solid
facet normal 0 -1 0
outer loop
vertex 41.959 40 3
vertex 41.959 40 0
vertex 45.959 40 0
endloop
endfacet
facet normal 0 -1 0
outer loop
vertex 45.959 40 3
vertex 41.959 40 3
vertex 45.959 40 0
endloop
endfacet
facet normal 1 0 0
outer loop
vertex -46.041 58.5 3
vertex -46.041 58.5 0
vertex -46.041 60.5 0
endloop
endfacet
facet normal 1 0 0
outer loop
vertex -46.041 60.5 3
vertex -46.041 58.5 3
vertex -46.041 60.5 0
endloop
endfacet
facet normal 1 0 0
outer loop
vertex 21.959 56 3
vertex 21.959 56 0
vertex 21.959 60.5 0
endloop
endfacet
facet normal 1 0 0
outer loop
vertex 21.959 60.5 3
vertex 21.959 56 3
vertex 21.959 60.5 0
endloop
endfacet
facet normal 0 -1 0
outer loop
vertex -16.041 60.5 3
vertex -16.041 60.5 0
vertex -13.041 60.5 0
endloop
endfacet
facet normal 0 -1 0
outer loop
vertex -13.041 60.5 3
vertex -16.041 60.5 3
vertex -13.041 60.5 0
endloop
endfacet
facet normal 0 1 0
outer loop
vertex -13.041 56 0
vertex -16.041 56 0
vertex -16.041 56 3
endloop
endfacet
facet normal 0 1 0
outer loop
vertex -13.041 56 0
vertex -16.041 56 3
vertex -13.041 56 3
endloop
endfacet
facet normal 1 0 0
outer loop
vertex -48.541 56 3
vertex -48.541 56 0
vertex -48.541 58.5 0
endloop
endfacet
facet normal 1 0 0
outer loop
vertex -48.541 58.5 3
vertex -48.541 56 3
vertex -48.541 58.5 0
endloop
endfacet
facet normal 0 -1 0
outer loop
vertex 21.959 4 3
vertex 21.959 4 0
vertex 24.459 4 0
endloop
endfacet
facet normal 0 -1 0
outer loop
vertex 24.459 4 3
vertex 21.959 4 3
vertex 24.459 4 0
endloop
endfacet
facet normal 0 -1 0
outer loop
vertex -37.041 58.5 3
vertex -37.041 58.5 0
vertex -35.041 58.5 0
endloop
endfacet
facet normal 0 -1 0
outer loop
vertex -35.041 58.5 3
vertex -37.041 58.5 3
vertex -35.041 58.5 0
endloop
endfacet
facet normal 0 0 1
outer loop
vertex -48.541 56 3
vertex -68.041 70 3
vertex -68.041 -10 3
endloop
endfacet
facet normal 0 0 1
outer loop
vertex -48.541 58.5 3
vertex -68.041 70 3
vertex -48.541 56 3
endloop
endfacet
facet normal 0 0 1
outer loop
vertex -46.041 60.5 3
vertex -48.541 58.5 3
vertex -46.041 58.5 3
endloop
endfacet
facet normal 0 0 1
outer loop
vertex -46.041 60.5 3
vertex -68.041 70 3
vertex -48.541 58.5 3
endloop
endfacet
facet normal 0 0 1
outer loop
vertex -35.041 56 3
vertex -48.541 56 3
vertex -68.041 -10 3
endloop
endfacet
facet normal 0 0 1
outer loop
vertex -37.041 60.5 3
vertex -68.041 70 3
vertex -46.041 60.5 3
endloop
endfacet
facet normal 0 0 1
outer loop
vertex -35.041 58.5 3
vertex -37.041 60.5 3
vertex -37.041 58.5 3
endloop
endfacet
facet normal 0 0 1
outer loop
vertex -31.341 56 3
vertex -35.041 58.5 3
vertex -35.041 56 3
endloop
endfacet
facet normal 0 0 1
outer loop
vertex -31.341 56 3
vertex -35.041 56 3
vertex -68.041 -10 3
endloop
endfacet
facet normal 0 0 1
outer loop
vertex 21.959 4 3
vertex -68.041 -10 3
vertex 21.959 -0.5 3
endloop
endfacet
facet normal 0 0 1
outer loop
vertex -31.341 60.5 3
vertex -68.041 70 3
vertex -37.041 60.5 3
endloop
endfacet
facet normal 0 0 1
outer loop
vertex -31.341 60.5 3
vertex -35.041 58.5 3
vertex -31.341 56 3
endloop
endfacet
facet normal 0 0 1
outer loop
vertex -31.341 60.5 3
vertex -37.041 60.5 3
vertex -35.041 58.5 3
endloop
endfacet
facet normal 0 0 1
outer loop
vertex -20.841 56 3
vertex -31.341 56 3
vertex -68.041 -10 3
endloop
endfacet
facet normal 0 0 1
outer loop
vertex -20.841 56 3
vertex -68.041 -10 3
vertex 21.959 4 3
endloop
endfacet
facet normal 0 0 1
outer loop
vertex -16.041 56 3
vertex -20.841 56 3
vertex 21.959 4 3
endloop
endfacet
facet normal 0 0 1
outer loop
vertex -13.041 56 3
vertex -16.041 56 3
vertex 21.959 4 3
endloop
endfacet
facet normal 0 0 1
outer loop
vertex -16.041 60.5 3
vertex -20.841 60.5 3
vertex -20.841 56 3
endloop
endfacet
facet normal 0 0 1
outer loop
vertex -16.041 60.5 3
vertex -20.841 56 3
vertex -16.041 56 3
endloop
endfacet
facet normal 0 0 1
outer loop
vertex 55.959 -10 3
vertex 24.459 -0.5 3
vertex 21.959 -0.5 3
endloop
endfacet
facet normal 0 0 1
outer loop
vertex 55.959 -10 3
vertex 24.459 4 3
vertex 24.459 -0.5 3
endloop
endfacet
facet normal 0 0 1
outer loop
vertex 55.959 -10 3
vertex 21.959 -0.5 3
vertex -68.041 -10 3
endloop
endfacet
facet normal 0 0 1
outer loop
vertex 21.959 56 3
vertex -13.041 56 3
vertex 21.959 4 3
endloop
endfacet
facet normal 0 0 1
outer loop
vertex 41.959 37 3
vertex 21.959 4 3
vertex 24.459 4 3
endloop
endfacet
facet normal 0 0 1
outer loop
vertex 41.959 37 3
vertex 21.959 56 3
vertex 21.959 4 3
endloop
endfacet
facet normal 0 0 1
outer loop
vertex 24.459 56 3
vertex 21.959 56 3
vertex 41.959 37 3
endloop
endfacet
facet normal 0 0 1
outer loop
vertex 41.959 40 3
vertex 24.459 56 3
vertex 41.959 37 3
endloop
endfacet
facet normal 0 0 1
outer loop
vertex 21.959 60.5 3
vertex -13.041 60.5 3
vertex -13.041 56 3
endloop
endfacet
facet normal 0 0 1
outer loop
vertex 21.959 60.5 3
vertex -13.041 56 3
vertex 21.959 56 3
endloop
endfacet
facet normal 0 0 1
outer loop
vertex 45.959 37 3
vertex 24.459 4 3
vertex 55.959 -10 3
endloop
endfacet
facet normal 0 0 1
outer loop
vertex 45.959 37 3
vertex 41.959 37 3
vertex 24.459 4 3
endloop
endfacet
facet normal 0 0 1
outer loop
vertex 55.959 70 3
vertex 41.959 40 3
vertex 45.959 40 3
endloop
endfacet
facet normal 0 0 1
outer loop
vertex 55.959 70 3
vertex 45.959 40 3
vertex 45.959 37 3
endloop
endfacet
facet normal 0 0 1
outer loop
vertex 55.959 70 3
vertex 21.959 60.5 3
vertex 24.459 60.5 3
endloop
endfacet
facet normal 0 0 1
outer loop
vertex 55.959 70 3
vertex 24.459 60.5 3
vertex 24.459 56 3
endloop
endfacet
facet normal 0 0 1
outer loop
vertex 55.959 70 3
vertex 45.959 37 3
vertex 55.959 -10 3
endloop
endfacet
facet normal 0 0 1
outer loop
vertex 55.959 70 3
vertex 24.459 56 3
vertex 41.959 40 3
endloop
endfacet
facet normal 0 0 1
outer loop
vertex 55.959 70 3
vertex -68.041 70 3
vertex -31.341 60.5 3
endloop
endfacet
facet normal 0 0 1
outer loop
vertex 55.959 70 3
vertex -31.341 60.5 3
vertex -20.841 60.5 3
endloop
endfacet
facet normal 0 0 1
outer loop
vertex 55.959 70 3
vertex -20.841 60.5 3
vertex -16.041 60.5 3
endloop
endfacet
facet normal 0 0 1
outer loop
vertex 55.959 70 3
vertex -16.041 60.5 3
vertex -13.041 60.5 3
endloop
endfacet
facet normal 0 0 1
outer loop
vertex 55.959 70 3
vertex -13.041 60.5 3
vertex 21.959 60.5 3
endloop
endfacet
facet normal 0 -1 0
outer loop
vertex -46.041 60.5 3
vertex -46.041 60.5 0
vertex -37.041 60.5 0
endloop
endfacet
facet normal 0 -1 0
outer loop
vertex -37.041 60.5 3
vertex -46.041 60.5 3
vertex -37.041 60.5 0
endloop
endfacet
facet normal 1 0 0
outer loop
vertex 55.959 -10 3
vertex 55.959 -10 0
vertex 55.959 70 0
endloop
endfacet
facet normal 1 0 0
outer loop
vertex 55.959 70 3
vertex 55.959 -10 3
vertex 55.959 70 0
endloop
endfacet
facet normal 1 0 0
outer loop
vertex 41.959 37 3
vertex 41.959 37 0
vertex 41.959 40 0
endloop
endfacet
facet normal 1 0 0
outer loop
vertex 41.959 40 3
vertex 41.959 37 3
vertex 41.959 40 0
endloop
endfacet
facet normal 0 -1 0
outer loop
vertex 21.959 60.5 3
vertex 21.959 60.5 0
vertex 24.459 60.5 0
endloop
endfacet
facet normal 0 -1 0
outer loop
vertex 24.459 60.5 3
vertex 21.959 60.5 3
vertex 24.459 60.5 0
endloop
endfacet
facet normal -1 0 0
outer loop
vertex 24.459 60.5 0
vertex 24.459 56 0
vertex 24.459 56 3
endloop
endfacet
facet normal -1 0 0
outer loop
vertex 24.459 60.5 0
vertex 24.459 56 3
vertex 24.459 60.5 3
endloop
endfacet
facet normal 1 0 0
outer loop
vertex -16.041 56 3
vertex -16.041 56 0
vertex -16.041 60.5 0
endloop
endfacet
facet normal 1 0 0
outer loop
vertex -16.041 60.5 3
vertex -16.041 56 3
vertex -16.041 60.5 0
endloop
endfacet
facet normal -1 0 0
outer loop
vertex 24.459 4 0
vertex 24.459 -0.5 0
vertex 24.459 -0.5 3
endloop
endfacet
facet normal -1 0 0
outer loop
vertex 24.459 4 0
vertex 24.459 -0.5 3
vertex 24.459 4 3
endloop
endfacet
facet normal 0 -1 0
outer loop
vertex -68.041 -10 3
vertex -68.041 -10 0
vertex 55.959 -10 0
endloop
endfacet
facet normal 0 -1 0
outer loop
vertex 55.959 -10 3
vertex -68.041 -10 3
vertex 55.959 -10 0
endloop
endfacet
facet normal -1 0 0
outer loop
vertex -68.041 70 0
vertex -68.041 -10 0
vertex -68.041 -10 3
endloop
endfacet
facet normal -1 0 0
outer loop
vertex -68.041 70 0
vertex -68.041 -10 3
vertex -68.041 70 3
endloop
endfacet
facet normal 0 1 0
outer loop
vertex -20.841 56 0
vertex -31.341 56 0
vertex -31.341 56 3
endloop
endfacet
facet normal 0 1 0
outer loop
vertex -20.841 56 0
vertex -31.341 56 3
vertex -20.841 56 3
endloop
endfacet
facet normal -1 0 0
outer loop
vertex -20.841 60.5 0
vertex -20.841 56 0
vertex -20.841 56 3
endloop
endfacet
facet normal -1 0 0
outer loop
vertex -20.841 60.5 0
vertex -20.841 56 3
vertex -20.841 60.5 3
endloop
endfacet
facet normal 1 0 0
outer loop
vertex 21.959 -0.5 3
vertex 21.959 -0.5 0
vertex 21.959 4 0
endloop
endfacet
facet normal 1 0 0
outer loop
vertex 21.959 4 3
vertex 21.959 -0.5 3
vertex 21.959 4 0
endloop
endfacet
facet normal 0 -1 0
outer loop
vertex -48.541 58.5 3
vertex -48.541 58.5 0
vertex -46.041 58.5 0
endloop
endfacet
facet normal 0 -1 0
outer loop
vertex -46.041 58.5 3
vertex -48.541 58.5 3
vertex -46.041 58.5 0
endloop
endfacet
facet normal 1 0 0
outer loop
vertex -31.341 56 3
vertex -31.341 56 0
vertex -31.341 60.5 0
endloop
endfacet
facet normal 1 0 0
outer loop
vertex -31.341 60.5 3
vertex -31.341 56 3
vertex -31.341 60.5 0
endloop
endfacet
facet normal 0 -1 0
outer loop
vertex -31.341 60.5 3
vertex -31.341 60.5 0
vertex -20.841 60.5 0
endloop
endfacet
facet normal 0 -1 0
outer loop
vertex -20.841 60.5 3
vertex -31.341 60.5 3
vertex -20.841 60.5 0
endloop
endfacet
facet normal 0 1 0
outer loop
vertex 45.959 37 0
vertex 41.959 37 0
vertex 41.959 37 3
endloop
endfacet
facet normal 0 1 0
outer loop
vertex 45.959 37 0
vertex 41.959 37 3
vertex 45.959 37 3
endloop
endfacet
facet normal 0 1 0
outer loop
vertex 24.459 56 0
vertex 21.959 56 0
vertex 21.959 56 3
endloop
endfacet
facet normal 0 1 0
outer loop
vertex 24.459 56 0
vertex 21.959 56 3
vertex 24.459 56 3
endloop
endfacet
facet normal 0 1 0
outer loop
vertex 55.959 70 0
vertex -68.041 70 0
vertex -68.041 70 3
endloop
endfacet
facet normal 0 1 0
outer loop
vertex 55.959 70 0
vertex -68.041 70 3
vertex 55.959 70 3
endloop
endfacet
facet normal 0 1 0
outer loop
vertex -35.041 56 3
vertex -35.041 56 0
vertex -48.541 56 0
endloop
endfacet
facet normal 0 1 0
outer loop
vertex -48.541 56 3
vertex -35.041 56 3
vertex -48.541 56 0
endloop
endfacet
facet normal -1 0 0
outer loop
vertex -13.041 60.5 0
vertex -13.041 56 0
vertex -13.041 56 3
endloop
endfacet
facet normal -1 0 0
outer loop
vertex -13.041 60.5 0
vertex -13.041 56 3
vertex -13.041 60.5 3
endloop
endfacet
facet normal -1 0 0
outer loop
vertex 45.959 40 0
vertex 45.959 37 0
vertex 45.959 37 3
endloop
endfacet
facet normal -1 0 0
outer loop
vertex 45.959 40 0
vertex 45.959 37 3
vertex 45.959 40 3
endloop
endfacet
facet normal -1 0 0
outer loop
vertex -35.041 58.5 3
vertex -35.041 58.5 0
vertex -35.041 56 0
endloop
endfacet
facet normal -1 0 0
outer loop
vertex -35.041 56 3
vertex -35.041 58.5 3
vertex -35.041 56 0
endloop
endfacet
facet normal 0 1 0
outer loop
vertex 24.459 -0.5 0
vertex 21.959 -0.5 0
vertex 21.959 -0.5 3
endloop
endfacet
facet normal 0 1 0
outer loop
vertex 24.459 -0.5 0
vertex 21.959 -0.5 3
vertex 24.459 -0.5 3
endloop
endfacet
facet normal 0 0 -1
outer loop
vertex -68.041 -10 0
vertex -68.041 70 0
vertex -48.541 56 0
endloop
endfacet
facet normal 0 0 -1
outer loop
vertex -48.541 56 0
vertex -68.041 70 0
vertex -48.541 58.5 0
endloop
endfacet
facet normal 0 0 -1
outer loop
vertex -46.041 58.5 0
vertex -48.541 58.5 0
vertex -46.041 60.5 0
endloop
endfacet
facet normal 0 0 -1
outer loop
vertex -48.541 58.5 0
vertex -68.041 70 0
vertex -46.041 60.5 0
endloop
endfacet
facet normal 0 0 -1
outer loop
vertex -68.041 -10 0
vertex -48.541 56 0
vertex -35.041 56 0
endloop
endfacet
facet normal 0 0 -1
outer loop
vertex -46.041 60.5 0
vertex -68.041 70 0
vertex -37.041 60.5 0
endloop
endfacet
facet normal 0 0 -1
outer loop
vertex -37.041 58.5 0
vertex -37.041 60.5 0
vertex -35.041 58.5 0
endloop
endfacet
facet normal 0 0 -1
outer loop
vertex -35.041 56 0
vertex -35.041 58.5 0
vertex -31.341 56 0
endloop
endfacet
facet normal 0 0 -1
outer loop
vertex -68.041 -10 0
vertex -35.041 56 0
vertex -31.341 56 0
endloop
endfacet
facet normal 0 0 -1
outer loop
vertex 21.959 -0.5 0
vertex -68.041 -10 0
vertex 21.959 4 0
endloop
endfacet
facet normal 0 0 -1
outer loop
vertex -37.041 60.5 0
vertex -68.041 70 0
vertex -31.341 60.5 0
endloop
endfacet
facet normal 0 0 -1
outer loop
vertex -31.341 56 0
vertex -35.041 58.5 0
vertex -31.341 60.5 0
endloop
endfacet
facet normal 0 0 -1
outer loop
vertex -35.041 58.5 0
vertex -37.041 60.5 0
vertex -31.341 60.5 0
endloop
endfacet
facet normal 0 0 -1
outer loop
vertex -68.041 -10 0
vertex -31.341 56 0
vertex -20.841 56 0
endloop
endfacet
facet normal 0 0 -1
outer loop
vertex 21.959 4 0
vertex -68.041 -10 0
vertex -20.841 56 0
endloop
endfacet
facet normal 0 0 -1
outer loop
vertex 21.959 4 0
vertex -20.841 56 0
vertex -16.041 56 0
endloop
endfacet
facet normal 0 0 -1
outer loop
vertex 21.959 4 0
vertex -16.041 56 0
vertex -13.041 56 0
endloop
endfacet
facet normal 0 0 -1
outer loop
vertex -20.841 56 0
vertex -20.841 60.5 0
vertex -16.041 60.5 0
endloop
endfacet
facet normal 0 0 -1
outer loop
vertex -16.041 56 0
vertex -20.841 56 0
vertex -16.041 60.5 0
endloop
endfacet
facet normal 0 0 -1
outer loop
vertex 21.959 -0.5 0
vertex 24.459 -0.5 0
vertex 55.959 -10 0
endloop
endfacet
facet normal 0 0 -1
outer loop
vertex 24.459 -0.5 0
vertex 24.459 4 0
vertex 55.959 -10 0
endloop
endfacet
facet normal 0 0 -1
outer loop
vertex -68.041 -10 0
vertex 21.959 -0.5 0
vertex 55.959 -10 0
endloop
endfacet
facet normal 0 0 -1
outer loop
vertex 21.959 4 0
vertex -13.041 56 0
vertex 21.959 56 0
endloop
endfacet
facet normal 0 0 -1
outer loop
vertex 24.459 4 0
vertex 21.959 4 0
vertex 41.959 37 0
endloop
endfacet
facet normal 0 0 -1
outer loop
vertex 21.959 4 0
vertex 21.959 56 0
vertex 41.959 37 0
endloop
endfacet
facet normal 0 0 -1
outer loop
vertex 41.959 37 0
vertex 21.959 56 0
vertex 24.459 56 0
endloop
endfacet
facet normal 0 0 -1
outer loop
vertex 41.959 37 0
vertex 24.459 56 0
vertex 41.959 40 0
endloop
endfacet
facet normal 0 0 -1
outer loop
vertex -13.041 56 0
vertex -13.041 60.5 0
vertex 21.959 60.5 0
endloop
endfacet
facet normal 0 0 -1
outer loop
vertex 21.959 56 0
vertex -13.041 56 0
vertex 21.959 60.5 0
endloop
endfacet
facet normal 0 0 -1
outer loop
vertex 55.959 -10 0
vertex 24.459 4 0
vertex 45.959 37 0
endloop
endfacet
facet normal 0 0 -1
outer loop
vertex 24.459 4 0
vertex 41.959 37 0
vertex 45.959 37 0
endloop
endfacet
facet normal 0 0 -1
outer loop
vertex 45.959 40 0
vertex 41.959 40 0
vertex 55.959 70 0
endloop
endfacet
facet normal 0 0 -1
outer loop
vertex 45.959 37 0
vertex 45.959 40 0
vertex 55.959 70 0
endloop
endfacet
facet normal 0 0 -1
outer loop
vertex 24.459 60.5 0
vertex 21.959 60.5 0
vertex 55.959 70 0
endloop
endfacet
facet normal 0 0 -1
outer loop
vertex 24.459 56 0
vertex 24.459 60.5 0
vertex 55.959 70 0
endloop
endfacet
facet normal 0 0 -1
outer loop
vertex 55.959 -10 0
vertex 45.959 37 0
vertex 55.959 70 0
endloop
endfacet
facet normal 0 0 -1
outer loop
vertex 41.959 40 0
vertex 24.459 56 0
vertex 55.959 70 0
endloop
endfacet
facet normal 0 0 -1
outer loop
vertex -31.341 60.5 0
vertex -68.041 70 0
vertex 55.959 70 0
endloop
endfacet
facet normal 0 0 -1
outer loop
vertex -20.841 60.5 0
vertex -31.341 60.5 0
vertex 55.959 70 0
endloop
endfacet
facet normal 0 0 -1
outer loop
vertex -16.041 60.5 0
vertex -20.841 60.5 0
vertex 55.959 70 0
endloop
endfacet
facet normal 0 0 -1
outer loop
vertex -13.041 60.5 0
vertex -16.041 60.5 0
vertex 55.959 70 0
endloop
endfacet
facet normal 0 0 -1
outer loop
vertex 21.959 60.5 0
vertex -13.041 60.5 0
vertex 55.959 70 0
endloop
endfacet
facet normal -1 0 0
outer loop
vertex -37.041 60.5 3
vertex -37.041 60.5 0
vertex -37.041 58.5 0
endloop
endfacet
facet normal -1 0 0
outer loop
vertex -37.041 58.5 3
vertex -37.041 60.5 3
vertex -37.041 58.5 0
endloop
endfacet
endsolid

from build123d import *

# Parameters (mm, degrees)
F0_W     = 124
F0_H     = 80
F0_W_2   = 2.5
F0_H_2   = 4.5
F0_W_3   = 10.5
F0_W_4   = 3
F0_W_5   = 4
F0_H_3   = 3
F1_DEPTH = 3


# Not quite as in the source:
# - a feature names something its author has since deleted; it is built from what else it names


with BuildPart() as f1:
    # F0 (on Top) → F1 (new body)
    with BuildSketch(Plane.XY):
        with Locations((-6.0411174464, 30)):
            Rectangle(F0_W, F0_H)
        with Locations((23.2088825536, 1.75)):
            Rectangle(F0_W_2, F0_H_2, mode=Mode.SUBTRACT)
        Polygon((-35.0411174464, 58.5), (-35.0411174464, 56), (-48.5411174464, 56), (-48.5411174464, 58.5), (-46.0411174464, 58.5), (-46.0411174464, 60.5), (-37.0411174464, 60.5), (-37.0411174464, 58.5), align=None, mode=Mode.SUBTRACT)
        with Locations((-26.0911174464, 58.25)):
            Rectangle(F0_W_3, F0_H_2, mode=Mode.SUBTRACT)
        with Locations((-14.5411174464, 58.25)):
            Rectangle(F0_W_4, F0_H_2, mode=Mode.SUBTRACT)
        with Locations((43.9588825536, 38.5)):
            Rectangle(F0_W_5, F0_H_3, mode=Mode.SUBTRACT)
        with Locations((23.2088825536, 58.25)):
            Rectangle(F0_W_2, F0_H_2, mode=Mode.SUBTRACT)
    extrude(amount=F1_DEPTH)


solid = f1.part
